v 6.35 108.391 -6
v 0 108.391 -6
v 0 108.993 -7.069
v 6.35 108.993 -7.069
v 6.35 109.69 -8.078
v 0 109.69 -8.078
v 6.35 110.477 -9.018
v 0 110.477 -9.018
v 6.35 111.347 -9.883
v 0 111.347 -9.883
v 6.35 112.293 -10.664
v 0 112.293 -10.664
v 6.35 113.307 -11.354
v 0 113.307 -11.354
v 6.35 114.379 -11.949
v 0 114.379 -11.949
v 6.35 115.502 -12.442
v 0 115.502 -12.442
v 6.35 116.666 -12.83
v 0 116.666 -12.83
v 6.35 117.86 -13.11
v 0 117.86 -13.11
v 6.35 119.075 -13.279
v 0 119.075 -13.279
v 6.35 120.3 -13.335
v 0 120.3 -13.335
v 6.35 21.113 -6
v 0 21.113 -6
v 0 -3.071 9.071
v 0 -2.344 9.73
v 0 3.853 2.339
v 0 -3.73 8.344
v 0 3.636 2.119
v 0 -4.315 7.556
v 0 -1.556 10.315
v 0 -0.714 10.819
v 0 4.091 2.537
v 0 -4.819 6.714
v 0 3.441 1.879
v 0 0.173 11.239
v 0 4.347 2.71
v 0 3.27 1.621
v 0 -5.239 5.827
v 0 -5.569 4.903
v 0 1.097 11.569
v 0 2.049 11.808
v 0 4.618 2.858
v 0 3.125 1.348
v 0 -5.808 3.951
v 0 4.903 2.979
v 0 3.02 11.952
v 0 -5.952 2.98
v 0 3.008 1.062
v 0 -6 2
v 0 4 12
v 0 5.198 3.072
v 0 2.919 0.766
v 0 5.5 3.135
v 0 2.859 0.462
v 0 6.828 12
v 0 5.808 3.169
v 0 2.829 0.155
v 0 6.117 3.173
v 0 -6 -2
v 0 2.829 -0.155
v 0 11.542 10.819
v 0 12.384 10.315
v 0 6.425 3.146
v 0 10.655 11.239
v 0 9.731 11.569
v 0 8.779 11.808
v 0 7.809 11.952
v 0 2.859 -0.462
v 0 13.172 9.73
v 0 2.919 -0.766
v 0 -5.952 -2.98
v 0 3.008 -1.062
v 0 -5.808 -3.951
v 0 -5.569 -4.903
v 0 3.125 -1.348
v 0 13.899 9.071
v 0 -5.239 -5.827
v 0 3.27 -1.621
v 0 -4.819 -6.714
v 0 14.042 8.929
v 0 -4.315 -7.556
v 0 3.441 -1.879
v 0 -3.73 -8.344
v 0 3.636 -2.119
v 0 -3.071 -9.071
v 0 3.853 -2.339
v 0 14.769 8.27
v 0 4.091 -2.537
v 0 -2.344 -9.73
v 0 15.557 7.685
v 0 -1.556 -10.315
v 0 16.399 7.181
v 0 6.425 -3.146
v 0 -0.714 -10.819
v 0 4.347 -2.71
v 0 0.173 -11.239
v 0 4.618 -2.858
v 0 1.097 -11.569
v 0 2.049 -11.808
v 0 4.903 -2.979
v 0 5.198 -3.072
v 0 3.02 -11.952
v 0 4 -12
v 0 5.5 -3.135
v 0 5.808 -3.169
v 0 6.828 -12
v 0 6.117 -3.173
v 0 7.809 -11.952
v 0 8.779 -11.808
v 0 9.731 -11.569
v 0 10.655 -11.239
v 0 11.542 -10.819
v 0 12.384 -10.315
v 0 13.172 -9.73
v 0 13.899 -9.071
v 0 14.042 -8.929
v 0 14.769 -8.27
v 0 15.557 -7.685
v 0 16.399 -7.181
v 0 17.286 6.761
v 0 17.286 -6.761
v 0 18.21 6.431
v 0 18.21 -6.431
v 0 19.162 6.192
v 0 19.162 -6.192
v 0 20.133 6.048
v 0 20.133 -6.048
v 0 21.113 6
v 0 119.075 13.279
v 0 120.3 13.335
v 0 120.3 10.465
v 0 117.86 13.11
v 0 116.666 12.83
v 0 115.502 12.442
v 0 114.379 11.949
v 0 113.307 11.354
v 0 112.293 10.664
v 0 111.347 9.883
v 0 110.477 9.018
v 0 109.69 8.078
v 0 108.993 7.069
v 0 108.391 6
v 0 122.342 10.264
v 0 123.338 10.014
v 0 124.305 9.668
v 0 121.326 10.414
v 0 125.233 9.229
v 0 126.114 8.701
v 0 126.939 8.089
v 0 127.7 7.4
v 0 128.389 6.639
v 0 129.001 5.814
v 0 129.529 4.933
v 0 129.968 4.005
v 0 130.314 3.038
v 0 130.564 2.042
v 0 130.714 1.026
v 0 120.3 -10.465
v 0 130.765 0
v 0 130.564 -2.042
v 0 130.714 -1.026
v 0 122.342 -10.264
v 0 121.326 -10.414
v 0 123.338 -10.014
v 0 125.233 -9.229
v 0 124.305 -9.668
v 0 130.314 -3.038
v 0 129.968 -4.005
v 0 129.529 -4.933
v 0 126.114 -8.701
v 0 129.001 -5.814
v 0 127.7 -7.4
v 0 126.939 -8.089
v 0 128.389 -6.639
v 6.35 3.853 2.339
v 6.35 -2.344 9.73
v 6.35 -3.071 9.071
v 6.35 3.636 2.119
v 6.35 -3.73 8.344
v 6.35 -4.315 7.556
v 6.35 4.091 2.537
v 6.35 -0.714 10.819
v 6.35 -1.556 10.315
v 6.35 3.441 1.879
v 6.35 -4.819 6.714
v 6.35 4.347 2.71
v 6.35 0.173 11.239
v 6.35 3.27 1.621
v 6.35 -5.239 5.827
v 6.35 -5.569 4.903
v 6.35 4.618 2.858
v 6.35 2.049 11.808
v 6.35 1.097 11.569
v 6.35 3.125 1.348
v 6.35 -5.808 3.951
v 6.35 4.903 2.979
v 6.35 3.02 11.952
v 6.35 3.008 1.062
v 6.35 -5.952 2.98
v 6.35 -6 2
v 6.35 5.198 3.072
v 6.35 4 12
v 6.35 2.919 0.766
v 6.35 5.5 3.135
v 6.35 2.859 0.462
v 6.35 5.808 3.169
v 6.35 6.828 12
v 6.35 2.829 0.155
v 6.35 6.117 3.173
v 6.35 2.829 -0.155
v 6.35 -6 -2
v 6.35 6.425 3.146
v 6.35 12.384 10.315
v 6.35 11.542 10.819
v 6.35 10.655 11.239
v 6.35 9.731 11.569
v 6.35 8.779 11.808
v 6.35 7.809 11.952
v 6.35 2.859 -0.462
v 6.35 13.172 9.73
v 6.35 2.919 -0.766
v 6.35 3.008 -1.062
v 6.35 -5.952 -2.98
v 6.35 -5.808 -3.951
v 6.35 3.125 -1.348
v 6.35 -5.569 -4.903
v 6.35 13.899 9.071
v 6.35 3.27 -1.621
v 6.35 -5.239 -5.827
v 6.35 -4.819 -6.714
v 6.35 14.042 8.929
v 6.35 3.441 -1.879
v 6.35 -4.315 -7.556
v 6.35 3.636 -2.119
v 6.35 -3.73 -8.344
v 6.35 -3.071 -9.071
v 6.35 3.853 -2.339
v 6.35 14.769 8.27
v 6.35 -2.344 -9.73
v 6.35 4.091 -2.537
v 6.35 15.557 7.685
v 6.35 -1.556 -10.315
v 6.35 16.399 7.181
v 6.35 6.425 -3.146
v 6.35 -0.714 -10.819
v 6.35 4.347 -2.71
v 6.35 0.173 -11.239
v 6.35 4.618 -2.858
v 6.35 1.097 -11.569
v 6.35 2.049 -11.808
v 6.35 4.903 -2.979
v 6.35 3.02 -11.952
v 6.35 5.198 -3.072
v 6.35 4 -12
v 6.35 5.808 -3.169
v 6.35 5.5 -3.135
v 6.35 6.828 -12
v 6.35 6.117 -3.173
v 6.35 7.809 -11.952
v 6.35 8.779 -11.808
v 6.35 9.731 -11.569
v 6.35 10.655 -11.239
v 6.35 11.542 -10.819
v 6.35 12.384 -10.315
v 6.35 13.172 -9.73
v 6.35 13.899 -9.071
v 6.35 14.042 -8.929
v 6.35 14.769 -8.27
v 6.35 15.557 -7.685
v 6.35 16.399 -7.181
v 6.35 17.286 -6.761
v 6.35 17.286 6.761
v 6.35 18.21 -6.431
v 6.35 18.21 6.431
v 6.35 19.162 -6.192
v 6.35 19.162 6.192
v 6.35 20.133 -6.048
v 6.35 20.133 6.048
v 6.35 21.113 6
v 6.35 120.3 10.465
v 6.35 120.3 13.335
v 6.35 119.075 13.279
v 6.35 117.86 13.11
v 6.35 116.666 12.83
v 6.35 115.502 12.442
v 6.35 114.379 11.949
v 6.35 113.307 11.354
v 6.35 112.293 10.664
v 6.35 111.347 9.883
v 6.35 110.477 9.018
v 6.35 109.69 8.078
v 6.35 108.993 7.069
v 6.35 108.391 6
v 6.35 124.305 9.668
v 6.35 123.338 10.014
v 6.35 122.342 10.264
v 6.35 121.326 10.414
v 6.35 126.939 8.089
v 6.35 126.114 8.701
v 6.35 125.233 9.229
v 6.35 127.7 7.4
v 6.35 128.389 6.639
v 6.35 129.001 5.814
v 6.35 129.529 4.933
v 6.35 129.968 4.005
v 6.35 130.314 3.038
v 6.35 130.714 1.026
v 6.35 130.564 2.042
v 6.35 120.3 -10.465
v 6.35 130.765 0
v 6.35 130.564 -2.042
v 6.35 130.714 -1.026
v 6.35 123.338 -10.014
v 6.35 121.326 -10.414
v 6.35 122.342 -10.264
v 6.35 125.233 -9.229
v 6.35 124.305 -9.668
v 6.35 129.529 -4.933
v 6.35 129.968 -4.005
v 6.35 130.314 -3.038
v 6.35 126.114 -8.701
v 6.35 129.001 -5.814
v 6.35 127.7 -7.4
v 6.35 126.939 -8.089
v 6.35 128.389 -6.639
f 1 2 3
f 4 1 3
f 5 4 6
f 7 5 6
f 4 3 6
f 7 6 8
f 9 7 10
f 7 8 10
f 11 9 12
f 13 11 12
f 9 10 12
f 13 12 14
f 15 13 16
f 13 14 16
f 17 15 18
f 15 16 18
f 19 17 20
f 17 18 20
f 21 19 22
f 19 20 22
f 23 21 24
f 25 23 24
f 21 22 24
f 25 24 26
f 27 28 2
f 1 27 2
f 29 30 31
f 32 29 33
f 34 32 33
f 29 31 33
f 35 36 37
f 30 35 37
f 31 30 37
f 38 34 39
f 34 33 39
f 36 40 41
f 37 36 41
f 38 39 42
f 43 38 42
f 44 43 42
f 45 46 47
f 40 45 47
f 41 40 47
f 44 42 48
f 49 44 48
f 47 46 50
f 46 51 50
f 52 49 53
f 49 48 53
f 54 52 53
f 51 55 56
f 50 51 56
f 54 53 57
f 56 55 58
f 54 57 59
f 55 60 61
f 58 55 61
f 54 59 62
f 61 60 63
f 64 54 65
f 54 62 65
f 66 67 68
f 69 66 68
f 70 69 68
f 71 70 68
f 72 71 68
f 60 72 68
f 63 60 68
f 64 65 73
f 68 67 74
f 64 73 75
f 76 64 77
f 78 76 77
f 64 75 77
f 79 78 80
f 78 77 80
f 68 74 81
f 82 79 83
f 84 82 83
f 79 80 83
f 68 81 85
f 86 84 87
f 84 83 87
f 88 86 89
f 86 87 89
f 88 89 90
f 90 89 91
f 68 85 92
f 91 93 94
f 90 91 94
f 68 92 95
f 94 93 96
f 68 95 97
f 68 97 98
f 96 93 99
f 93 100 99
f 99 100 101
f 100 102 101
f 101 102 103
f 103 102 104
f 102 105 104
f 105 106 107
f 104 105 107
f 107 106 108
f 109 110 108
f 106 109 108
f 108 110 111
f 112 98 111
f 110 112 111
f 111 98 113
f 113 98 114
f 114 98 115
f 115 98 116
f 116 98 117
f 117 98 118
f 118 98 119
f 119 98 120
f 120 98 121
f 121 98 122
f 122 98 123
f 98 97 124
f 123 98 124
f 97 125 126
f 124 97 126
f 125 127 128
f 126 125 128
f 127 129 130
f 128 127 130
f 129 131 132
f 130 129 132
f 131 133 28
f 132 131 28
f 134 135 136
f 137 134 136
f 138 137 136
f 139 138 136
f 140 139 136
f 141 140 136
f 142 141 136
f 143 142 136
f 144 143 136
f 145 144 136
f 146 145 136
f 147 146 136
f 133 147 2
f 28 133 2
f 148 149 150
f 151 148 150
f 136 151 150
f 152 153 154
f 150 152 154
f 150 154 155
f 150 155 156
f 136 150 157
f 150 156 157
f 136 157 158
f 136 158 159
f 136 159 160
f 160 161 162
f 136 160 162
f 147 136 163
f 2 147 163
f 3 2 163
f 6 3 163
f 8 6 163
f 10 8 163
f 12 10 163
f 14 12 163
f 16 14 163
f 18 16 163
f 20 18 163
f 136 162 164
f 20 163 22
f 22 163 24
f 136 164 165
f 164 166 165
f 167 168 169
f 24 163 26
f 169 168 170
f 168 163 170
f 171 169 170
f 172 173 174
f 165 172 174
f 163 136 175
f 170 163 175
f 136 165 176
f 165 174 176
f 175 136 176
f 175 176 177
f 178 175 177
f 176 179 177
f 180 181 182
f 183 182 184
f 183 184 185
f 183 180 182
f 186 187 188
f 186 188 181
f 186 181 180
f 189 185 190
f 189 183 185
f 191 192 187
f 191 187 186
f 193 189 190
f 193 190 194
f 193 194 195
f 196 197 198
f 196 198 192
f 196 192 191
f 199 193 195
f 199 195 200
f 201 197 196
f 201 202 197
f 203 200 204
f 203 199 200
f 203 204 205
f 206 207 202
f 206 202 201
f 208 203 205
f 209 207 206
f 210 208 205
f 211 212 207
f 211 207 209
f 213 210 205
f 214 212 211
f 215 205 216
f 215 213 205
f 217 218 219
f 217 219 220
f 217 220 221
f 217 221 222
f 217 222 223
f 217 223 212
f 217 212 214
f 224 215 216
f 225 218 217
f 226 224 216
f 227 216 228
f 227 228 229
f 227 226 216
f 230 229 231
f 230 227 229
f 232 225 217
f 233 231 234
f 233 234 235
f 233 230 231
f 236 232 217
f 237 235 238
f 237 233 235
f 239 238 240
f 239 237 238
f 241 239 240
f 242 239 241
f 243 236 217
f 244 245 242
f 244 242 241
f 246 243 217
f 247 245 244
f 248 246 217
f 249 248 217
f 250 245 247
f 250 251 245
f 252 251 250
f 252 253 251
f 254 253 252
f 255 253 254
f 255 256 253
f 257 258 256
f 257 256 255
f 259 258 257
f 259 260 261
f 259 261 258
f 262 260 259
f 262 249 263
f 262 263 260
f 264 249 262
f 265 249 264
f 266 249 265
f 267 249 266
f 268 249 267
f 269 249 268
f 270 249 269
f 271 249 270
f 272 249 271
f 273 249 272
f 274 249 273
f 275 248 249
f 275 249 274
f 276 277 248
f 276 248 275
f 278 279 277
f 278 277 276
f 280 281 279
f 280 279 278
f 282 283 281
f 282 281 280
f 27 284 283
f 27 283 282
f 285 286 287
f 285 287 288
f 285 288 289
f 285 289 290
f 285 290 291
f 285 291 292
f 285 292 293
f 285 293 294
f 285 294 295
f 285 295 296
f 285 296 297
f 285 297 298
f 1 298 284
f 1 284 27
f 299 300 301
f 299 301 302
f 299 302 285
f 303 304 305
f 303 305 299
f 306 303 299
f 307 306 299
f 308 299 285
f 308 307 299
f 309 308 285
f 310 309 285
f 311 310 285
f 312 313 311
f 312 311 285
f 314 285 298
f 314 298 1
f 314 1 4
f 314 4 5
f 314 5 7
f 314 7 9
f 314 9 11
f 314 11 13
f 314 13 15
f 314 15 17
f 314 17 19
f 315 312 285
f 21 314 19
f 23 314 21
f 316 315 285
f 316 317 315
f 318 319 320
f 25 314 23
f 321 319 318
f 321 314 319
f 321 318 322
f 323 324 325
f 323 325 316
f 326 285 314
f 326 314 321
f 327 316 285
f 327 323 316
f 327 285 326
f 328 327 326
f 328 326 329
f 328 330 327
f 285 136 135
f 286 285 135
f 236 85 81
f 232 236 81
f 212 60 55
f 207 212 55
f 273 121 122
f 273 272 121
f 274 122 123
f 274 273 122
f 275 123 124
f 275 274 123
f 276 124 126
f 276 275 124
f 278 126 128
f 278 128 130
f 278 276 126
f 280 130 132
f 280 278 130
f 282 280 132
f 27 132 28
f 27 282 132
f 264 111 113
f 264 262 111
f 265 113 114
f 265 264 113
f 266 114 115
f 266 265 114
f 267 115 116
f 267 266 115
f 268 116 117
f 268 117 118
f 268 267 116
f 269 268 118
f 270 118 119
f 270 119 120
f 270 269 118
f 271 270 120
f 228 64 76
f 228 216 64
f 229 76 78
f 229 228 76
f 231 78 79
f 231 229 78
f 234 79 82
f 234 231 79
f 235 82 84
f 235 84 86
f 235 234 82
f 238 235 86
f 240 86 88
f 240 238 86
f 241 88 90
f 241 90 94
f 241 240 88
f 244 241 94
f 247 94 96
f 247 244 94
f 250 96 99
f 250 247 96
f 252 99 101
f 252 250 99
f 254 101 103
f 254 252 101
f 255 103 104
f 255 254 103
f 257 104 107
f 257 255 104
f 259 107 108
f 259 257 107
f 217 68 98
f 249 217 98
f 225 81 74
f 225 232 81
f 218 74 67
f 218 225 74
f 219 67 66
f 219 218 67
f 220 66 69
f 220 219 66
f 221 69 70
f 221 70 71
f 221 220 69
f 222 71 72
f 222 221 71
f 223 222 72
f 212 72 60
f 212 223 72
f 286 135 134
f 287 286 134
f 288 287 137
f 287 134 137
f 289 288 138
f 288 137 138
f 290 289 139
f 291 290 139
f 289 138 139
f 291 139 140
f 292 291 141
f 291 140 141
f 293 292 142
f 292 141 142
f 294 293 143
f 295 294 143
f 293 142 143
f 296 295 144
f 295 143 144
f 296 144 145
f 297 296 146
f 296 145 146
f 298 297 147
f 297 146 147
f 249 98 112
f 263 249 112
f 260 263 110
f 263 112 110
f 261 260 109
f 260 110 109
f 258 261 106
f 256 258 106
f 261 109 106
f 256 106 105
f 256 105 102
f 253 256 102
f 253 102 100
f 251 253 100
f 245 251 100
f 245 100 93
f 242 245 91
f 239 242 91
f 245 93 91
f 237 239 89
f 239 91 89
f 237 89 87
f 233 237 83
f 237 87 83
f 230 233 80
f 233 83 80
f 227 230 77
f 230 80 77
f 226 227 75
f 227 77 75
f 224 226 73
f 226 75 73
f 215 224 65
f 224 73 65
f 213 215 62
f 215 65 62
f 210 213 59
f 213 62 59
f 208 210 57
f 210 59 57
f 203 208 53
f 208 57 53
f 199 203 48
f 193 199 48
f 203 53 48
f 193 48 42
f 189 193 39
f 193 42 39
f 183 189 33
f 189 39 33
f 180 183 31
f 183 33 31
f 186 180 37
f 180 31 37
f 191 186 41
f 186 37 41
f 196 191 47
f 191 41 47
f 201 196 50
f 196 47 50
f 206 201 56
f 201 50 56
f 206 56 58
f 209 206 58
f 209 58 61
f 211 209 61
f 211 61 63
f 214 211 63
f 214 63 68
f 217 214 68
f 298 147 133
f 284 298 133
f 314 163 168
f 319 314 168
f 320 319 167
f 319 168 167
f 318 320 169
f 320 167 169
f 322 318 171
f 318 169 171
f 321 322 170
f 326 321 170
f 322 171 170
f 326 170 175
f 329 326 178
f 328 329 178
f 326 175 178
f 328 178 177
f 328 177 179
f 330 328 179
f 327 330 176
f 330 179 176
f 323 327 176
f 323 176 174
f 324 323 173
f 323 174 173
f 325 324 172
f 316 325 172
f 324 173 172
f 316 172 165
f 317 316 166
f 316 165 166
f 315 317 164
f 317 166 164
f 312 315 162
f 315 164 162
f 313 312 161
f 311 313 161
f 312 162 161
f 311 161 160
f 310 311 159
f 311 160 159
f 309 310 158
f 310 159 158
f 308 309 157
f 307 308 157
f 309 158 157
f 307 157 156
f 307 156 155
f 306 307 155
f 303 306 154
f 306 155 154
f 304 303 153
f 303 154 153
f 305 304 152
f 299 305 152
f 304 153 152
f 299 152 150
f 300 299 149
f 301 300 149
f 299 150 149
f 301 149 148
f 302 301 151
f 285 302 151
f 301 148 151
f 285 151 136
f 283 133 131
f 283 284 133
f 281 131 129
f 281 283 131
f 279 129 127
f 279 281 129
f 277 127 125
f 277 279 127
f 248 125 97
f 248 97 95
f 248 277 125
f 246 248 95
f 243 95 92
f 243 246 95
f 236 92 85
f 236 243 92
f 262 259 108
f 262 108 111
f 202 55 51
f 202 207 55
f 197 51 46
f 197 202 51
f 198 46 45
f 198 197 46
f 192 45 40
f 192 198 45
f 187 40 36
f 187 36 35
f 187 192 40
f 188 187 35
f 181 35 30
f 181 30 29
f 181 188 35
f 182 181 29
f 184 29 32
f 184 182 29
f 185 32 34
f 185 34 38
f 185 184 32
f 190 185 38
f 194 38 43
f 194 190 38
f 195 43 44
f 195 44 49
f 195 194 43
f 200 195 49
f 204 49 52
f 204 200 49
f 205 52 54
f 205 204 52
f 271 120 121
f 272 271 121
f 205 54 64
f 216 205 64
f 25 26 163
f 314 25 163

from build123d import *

# Parameters (mm, degrees)
BOSS_EXTRUDE1_DEPTH = 6.35
FILLET1_R           = 10


with BuildPart() as part:
    # Sketch1 → Boss-Extrude1 (new body)
    with BuildSketch(Plane(origin=(0, 0, 0), x_dir=(0, 0, -1), z_dir=(1, 0, 0))):
        with BuildLine():
            Line((-6, 108.391086322), (-6, 16.970562748))
            Line((-6, 16.970562748), (-12, 10.970562748))
            Line((-12, 10.970562748), (-12, -6))
            Line((-12, -6), (12, -6))
            Line((12, -6), (12, 10.970562748))
            Line((12, 10.970562748), (6, 16.970562748))
            Line((6, 16.970562748), (6, 108.391086322))
            ThreePointArc((6, 108.391086322), (11.35412315, 113.306709465), (13.335, 120.3))
            Line((13.335, 120.3), (10.4648, 120.3))
            ThreePointArc((10.4648, 120.3), (0, 130.7648), (-10.4648, 120.3))
            Line((-10.4648, 120.3), (-13.335, 120.3))
            ThreePointArc((-13.335, 120.3), (-11.35412315, 113.306709465), (-6, 108.391086322))
        make_face()
        with BuildLine():
            Line((-3.146426545, 6.425), (3.146426545, 6.425))
            ThreePointArc((3.146426545, 6.425), (0, 2.825), (-3.146426545, 6.425))
        make_face(mode=Mode.SUBTRACT)
    extrude(amount=BOSS_EXTRUDE1_DEPTH)

    # Fillet1
    fillet1_edges = [part.edges().sort_by_distance(p)[0] for p in [
        (3.175, 16.970562748, -6),
        (3.175, 10.970562748, -12),
        (3.175, -6, -12),
        (3.175, -6, 12),
        (3.175, 10.970562748, 12),
        (3.175, 16.970562748, 6),
    ]]
    fillet(fillet1_edges, radius=FILLET1_R)


solid = part.part
